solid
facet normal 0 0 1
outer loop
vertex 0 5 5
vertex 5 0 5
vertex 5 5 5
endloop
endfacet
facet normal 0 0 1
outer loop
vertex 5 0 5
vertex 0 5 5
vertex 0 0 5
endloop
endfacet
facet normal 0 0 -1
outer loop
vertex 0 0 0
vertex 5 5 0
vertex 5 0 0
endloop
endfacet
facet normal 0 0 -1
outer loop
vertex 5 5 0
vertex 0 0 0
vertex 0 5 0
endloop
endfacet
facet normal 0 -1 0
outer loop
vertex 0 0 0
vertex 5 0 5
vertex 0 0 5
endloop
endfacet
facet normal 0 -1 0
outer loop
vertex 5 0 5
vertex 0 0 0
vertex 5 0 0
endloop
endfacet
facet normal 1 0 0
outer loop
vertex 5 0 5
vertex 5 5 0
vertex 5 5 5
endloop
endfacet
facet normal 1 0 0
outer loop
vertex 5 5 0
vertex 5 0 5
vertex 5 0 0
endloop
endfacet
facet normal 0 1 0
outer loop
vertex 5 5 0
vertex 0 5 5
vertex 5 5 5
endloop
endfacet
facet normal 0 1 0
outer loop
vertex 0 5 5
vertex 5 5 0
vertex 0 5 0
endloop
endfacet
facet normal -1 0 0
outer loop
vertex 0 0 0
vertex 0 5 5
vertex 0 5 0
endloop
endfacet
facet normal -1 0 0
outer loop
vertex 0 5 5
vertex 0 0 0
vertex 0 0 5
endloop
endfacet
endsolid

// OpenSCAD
// expect: shows only this part
cube(10);
translate([20, 0, 0]) !cube(5);
